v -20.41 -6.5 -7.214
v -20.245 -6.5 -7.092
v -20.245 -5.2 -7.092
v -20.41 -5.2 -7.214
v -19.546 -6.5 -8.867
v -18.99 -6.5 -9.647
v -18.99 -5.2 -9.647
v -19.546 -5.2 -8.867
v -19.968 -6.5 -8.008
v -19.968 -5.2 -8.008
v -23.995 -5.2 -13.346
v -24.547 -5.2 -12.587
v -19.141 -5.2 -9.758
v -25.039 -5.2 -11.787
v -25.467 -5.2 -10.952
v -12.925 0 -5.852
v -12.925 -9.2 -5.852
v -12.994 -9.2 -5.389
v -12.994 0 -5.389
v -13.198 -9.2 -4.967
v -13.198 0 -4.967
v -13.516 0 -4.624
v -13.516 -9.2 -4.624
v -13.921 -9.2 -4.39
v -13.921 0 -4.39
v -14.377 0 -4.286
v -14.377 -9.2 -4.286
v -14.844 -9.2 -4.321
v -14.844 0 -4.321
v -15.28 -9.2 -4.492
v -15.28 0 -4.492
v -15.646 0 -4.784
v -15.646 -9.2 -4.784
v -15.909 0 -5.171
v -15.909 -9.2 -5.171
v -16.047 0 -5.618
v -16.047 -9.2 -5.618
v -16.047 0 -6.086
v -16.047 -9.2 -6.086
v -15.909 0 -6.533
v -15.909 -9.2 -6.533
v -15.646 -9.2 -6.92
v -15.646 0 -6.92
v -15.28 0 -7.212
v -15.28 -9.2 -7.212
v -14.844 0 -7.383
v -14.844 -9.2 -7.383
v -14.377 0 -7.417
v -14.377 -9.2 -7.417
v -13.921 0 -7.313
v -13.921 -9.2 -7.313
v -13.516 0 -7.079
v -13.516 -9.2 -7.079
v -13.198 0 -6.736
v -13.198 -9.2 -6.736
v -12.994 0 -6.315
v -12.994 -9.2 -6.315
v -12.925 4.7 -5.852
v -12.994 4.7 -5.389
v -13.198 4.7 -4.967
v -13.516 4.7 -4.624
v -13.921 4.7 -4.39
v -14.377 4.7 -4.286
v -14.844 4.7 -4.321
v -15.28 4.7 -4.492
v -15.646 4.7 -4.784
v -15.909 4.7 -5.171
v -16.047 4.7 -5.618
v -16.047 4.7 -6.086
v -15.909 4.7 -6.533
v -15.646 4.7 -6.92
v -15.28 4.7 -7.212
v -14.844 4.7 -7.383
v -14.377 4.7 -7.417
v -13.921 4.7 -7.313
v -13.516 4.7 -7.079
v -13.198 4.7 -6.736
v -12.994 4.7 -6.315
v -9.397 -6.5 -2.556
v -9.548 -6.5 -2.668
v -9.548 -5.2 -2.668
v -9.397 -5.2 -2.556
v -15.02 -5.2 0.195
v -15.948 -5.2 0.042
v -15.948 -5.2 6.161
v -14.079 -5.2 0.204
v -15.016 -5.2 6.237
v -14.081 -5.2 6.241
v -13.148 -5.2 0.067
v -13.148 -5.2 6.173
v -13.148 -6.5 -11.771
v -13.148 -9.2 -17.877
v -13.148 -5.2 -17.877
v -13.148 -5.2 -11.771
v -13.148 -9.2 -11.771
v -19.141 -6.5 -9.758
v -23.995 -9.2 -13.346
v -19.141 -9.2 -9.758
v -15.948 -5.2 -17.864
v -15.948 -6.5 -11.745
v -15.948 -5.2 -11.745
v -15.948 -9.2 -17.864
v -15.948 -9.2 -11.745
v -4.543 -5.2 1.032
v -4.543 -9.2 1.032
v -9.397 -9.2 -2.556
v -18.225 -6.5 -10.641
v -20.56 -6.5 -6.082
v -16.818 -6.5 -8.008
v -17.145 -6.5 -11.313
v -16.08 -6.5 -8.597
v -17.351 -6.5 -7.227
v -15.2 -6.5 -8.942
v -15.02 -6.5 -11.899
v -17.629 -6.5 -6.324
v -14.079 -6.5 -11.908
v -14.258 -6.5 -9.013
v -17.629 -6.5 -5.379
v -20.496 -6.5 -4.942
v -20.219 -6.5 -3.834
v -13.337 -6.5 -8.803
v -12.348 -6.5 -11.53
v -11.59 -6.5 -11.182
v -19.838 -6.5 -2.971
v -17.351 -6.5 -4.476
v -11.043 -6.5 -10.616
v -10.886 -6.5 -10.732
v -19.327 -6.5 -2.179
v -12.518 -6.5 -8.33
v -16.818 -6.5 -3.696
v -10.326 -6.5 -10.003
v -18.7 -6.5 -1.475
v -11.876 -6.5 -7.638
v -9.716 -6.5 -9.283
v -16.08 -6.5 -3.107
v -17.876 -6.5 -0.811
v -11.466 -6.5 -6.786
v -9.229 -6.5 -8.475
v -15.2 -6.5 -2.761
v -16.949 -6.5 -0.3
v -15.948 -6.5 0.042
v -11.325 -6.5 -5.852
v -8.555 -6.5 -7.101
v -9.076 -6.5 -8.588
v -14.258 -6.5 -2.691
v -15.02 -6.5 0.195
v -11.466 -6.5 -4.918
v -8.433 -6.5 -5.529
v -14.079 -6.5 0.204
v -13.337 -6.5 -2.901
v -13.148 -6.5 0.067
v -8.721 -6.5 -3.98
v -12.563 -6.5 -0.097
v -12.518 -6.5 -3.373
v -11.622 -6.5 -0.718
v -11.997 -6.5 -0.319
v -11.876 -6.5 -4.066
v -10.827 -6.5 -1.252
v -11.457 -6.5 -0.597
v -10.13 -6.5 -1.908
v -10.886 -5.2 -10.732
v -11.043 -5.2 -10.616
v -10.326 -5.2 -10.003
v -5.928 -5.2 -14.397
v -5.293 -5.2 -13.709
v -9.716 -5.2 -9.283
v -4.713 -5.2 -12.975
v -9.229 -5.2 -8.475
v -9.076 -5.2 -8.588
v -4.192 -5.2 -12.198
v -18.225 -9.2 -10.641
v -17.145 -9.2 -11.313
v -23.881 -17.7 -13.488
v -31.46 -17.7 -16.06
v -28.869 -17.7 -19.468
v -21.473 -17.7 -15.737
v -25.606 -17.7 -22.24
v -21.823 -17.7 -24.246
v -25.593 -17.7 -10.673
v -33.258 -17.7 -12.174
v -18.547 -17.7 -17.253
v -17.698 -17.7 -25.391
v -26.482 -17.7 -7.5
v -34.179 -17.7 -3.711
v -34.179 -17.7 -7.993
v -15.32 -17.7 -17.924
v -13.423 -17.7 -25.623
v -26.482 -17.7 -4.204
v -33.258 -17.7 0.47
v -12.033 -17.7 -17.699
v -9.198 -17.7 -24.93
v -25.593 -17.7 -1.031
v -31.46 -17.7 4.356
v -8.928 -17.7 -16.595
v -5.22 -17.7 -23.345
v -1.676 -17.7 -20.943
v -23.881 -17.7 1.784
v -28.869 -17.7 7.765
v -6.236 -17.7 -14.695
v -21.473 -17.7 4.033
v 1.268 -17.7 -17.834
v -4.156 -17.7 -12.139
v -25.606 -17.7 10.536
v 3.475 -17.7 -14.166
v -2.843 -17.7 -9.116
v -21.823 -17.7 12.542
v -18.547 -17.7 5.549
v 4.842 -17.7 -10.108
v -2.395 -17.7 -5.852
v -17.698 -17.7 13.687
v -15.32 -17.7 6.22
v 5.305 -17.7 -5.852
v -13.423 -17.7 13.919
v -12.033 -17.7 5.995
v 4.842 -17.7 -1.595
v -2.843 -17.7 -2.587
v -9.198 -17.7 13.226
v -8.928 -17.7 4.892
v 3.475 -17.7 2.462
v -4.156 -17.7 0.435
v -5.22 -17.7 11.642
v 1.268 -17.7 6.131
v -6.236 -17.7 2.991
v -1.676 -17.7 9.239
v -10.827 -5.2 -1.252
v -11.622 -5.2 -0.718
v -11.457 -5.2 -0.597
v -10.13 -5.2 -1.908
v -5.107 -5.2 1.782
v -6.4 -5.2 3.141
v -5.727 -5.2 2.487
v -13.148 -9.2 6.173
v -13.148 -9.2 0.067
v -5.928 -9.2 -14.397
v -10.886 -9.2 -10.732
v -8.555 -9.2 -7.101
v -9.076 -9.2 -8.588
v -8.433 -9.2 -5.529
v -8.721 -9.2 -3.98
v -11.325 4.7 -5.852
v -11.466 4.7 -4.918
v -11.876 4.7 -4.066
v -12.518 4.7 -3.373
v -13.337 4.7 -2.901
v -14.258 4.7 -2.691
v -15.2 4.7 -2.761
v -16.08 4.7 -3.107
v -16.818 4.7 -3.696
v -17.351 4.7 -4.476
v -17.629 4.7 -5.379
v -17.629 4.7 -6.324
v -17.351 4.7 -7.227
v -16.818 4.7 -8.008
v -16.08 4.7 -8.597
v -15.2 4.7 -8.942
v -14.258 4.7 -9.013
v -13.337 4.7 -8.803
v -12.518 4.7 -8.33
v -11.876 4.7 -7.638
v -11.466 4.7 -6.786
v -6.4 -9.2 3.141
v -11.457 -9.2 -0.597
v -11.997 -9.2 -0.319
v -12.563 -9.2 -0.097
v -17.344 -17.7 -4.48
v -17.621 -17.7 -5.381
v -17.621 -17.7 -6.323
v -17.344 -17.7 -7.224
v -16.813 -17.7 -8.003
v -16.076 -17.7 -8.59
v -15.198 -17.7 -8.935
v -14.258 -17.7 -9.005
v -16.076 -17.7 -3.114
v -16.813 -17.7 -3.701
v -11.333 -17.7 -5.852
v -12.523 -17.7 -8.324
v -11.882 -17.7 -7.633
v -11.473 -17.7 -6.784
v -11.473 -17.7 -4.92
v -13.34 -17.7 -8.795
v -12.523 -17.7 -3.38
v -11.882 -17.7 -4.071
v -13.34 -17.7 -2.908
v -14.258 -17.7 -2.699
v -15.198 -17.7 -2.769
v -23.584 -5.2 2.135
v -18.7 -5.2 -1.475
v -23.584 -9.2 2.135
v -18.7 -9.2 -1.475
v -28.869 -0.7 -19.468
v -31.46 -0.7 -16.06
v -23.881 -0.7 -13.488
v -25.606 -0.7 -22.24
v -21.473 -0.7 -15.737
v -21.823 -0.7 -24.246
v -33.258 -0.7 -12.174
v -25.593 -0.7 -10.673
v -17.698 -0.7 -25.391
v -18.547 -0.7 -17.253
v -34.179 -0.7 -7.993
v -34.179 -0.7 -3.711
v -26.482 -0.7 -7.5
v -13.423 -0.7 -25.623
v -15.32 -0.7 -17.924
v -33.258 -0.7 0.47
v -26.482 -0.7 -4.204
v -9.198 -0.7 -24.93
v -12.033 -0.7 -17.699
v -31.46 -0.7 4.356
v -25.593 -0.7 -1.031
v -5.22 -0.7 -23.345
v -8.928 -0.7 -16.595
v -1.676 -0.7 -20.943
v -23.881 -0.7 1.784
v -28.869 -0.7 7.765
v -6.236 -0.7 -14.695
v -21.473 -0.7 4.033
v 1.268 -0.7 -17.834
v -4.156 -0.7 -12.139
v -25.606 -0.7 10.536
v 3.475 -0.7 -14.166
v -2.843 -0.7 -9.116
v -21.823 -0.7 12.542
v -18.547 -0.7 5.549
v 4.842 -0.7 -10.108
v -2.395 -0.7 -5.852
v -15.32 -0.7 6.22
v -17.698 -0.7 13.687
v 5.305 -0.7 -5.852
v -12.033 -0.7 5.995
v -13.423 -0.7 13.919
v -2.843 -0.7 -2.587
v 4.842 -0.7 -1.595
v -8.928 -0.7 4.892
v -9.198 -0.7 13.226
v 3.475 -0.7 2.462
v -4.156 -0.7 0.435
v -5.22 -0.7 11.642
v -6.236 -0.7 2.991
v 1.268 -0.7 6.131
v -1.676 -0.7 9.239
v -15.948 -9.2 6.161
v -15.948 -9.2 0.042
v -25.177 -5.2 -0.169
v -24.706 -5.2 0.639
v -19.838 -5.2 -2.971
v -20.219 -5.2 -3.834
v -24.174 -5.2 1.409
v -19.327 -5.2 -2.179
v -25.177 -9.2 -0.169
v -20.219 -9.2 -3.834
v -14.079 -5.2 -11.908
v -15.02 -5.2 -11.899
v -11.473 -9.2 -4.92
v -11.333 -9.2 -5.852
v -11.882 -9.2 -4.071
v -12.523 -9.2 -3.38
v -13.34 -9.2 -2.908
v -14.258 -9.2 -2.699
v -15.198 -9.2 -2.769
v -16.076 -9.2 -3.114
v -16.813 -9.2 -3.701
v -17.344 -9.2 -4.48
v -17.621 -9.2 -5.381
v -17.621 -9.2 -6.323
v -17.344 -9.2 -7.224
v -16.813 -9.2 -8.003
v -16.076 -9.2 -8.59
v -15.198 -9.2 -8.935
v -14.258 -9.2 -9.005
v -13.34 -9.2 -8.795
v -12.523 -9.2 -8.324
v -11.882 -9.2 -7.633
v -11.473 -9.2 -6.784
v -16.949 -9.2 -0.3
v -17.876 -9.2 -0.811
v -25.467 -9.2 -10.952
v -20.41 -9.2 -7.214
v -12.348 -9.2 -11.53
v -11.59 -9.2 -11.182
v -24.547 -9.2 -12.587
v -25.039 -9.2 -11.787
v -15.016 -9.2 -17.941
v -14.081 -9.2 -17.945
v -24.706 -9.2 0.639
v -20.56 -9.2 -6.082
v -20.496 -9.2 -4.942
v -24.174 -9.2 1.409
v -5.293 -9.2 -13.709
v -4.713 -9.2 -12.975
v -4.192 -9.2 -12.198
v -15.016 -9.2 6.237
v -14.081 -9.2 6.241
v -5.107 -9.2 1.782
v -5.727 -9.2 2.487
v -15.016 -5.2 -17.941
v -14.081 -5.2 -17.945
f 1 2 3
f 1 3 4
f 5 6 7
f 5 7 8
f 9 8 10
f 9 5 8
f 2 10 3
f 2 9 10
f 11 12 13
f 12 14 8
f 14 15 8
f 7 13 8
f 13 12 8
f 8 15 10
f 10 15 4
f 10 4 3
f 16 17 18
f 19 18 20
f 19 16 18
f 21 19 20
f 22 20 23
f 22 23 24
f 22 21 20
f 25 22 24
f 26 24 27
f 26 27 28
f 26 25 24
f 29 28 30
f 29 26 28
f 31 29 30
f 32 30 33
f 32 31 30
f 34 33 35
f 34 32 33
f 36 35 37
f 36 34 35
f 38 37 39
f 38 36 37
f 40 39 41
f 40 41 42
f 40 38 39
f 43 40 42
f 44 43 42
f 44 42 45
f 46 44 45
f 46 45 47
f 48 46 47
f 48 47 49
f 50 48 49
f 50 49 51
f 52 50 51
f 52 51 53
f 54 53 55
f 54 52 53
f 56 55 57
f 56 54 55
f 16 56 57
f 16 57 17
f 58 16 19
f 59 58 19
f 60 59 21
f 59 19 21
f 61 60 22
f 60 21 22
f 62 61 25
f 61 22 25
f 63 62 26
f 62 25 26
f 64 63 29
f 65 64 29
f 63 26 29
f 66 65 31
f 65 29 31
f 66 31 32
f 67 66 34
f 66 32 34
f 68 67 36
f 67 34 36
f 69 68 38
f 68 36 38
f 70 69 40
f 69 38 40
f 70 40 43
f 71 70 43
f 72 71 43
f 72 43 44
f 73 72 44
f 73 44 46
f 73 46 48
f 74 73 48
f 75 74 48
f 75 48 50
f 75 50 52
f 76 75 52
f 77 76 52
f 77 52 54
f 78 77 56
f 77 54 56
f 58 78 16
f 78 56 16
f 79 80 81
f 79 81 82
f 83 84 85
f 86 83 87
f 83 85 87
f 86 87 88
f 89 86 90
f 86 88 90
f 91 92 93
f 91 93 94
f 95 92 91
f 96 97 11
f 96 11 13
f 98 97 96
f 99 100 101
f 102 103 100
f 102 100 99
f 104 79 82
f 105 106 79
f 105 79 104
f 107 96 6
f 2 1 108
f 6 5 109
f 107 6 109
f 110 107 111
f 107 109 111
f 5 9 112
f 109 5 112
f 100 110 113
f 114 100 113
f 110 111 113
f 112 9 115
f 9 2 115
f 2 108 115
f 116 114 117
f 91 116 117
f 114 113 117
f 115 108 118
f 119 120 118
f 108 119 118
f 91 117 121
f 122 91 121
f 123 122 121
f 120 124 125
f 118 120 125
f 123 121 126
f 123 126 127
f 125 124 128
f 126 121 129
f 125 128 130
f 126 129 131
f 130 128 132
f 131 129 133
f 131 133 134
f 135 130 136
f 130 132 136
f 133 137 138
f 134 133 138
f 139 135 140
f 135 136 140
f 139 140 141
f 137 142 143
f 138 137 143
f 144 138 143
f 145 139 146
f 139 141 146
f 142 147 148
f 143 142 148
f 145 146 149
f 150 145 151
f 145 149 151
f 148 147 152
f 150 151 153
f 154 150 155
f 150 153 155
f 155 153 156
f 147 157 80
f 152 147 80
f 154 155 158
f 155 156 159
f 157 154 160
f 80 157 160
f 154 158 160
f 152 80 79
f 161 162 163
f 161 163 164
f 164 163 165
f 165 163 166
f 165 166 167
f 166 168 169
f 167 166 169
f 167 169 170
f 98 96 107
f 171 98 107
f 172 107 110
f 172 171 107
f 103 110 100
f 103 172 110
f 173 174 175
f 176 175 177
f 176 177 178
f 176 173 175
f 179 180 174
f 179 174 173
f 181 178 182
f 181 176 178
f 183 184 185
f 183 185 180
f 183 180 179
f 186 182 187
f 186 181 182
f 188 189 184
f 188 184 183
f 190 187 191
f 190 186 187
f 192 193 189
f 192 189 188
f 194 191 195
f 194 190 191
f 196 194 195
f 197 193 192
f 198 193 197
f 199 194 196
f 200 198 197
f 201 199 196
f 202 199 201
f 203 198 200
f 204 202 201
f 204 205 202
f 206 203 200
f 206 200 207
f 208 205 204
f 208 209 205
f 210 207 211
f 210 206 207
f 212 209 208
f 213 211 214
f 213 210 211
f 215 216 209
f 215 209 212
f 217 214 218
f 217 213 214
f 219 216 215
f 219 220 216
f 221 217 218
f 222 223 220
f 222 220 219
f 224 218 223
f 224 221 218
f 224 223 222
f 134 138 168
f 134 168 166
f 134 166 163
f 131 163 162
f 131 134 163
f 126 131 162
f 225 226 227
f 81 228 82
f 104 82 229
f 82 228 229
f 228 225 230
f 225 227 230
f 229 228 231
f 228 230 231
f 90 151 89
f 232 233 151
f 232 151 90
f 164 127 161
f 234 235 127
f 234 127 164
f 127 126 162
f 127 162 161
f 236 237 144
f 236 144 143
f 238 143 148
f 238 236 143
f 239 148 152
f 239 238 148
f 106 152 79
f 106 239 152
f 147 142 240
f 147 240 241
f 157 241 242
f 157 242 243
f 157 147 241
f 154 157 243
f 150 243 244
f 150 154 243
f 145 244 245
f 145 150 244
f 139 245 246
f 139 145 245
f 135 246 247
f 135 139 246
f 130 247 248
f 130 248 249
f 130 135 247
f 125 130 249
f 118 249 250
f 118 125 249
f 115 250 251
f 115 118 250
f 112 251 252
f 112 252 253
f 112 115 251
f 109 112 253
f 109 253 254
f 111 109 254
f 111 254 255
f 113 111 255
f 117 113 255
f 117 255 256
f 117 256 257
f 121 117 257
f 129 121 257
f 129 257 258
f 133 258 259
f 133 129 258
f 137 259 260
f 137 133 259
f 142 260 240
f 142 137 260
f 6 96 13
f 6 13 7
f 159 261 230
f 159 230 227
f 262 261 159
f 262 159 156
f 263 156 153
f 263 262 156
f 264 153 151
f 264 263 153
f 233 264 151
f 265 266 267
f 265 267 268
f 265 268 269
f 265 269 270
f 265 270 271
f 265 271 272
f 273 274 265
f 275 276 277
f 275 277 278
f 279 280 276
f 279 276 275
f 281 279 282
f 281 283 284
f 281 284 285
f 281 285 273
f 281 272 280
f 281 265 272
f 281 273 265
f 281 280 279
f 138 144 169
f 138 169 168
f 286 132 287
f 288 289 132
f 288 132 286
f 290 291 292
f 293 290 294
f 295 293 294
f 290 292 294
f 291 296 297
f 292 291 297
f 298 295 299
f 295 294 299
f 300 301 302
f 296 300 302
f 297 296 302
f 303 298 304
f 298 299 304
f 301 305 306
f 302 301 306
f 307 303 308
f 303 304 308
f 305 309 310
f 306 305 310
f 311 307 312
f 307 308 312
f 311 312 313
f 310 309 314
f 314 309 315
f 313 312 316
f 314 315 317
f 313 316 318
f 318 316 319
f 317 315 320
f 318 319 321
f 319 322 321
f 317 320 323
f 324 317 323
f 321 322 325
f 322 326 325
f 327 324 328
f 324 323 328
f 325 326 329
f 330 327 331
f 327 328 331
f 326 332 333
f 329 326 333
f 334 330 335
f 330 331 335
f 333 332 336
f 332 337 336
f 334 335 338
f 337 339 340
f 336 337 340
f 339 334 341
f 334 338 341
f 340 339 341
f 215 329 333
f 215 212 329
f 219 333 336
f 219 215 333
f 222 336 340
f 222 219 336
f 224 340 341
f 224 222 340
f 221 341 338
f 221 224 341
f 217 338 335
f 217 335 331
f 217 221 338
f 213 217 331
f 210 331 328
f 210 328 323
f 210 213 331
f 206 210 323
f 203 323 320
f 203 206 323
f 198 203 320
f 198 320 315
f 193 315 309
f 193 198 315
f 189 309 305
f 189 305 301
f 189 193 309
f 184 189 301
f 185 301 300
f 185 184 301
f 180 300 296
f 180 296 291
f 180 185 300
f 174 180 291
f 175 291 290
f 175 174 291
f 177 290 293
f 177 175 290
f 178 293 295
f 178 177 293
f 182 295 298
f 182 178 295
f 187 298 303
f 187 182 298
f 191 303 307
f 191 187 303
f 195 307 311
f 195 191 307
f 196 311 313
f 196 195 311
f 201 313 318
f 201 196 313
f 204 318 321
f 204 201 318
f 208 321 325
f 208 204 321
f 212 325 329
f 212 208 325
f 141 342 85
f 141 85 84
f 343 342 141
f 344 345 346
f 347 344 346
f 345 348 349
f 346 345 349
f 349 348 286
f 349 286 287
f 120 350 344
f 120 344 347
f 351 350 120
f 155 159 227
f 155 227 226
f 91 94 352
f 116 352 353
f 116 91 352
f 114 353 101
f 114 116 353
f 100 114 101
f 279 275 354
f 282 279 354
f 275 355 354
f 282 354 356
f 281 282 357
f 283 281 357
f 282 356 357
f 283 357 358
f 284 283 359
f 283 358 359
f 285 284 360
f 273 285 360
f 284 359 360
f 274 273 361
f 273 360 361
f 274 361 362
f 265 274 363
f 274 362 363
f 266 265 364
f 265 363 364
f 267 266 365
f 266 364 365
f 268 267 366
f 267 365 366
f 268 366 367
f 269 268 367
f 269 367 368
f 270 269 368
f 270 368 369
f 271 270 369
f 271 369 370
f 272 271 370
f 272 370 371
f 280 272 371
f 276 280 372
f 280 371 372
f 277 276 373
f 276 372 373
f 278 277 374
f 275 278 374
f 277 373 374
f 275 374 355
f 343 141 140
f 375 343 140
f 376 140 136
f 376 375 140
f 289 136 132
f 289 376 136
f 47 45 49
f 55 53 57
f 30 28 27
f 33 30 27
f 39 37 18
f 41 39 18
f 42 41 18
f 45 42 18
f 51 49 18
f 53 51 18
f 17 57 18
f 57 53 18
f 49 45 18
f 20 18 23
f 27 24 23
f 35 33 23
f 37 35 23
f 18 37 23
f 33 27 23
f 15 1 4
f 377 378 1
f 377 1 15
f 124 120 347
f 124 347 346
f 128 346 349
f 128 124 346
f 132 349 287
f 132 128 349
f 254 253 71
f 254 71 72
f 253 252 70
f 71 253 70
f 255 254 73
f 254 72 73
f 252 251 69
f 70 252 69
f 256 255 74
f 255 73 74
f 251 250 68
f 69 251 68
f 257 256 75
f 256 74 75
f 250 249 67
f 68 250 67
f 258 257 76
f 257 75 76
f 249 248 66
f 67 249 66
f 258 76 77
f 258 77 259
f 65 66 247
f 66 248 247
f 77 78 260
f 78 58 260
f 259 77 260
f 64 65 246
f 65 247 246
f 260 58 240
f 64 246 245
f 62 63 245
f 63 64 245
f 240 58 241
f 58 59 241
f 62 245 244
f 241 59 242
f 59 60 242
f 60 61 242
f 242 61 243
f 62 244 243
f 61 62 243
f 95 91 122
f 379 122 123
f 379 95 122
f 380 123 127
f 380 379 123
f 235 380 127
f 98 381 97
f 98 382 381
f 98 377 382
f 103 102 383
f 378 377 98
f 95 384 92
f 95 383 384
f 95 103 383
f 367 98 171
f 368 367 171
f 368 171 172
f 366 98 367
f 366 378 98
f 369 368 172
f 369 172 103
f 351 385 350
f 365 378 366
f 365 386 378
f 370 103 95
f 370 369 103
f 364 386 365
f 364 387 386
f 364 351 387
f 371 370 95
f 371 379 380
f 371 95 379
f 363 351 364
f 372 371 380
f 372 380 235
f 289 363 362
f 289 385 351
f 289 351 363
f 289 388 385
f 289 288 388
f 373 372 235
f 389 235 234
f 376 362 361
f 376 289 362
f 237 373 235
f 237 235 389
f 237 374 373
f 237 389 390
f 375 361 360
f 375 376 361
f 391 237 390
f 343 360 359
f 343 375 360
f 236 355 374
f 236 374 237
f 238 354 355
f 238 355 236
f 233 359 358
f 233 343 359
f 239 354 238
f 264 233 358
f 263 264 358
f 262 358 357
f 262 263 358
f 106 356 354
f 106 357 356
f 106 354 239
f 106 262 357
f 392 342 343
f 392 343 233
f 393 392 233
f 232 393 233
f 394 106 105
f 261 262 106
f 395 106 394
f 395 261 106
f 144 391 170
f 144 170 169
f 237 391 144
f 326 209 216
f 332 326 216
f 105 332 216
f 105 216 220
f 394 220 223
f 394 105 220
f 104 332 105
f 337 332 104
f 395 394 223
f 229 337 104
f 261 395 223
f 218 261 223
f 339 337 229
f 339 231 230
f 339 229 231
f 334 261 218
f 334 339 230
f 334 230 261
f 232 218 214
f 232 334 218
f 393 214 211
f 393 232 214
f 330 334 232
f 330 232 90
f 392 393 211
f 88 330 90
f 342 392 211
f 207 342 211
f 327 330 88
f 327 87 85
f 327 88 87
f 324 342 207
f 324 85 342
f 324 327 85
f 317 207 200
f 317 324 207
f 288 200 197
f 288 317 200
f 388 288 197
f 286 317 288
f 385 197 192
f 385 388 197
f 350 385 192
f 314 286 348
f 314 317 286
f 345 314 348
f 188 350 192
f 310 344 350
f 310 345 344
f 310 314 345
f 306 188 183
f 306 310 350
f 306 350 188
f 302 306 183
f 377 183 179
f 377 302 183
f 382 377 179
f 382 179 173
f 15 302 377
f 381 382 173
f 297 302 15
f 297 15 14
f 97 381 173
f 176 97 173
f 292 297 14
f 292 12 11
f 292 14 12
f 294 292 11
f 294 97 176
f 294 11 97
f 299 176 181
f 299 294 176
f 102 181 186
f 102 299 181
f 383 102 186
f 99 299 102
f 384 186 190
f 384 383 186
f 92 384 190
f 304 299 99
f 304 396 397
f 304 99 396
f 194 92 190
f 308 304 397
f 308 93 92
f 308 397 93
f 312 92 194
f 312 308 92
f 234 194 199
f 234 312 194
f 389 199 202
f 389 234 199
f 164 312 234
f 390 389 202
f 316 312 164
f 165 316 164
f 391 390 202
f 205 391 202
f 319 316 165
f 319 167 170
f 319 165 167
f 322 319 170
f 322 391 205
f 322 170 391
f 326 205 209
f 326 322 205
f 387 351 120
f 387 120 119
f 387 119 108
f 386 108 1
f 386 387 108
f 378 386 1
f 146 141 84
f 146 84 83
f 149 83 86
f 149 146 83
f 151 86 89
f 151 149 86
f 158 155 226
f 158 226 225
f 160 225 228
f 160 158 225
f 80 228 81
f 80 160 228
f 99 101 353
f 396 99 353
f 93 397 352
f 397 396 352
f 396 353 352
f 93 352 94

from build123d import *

# Parameters (mm, degrees)
F0_R      = 3.17
F0_R_2    = 1.57
F1_DEPTH  = 9.2
F2_R      = 6.07
F2_R_2    = 3.17
F3_DEPTH  = 2.7
F5_DEPTH  = 4
F6_R      = 19.8
F6_R_2    = 12.1
F7_DEPTH  = 8.5
F8_DEPTH  = 4.7
F9_R      = 3.1620005376
F10_DEPTH = 8.5
F11_DEPTH = 3


with BuildPart() as f1:
    # F0 (on Front) → F1 (new body)
    with BuildSketch(Plane.XZ):
        with Locations((-14.4947133958, -5.8518843725)):
            Circle(F0_R)
        with Locations((-14.4947133958, -5.8518843725)):
            Circle(F0_R_2, mode=Mode.SUBTRACT)
    extrude(amount=F1_DEPTH)

    # F8 (add): a face of the model
    f8_faces = [f1.faces().sort_by_distance(p)[0] for p in [
        (-17.575052256, 0, -5.8518843725),
    ]]
    extrude(f8_faces, amount=F8_DEPTH)

    # F9 (on face) → F10 (join, through all)
    with BuildSketch(Plane.XZ.offset(9.2)):
        with Locations((-14.4947133958, -5.8518843725)):
            Circle(F9_R)
    extrude(amount=F10_DEPTH)

    # F11 (add): a face of the model
    f11_faces = [f1.faces().sort_by_distance(p)[0] for p in [
        (-14.4947133958, -17.7, -5.8518843725),
    ]]


with BuildPart() as f3:
    # F2 (on face) → F3 (new body)
    with BuildSketch(Plane.XZ.offset(9.2)):
        with Locations((-14.4947133958, -5.8518843725)):
            Circle(F2_R)
        with Locations((-14.4947133958, -5.8518843725)):
            Circle(F2_R_2, mode=Mode.SUBTRACT)
    extrude(amount=-F3_DEPTH)


with BuildPart() as f5:
    # F4 (on face) → F5 (new body)
    with BuildSketch(Plane.XZ.offset(9.2)):
        with BuildLine():
            Line((-15.9479831574, 6.2612492848), (-15.9479831574, 0.0415787011))
            ThreePointArc((-15.9479831574, 0.0415787011), (-14.5494593079, 0.2178687431), (-13.1479831574, 0.0668331967))
            Line((-13.1479831574, 0.0668331967), (-13.1479831574, 6.2735565541))
            ThreePointArc((-13.1479831574, 6.2735565541), (-14.5483374083, 6.3479977771), (-15.9479831574, 6.2612492848))
        make_face()
    extrude(amount=-F5_DEPTH)


with BuildPart() as f5b:
    # F4 (on face) → F5, piece 2 (new body)
    with BuildSketch(Plane.XZ.offset(9.2)):
        with BuildLine():
            ThreePointArc((-9.3973258546, -2.5561992761), (-10.3108067194, -1.4541775926), (-11.4569494327, -0.5967069155))
            Line((-11.4569494327, -0.5967069155), (-11.6216113174, -0.7184141217))
            ThreePointArc((-11.6216113174, -0.7184141217), (-10.465246014, -1.5657876648), (-9.5481790309, -2.6676999957))
            Line((-9.5481790309, -2.6676999957), (-9.3973258546, -2.5561992761))
        make_face()
        with BuildLine():
            Line((-6.3175093497, 3.2020282617), (-11.4569494327, -0.5967069155))
            ThreePointArc((-11.4569494327, -0.5967069155), (-10.3108067194, -1.4541775926), (-9.3973258546, -2.5561992761))
            Line((-9.3973258546, -2.5561992761), (-4.4629317782, 1.0909794152))
            ThreePointArc((-4.4629317782, 1.0909794152), (-5.3292389654, 2.200076784), (-6.3175093497, 3.2020282617))
        make_face()
    extrude(amount=-F5_DEPTH)


with BuildPart() as f5c:
    # F4 (on face) → F5, piece 3 (new body)
    with BuildSketch(Plane.XZ.offset(9.2)):
        with BuildLine():
            ThreePointArc((-9.0762949538, -8.5878744286), (-9.8553405144, -9.7661045078), (-10.8856064508, -10.7323809722))
            Line((-10.8856064508, -10.7323809722), (-5.8464618601, -14.4569843356))
            ThreePointArc((-5.8464618601, -14.4569843356), (-4.9156940174, -13.4071730995), (-4.1116102126, -12.2574419818))
            Line((-4.1116102126, -12.2574419818), (-9.0762949538, -8.5878744286))
        make_face()
        with BuildLine():
            Line((-11.0433104475, -10.6158165779), (-10.8856064508, -10.7323809722))
            ThreePointArc((-10.8856064508, -10.7323809722), (-9.8553405144, -9.7661045078), (-9.0762949538, -8.5878744286))
            Line((-9.0762949538, -8.5878744286), (-9.2290879071, -8.4749399537))
            ThreePointArc((-9.2290879071, -8.4749399537), (-10.0066754756, -9.6551392938), (-11.0433104475, -10.6158165779))
        make_face()
    extrude(amount=-F5_DEPTH)


with BuildPart() as f5d:
    # F4 (on face) → F5, piece 4 (new body)
    with BuildSketch(Plane.XZ.offset(9.2)):
        with BuildLine():
            ThreePointArc((-13.1479831574, -11.7706019418), (-14.5494593079, -11.9216374882), (-15.9479831574, -11.7453474462))
            Line((-15.9479831574, -11.7453474462), (-15.9479831574, -17.9650180299))
            ThreePointArc((-15.9479831574, -17.9650180299), (-14.5483374083, -18.0517665222), (-13.1479831574, -17.9773252992))
            Line((-13.1479831574, -17.9773252992), (-13.1479831574, -11.7706019418))
        make_face()
    extrude(amount=-F5_DEPTH)


with BuildPart() as f5e:
    # F4 (on face) → F5, piece 5 (new body)
    with BuildSketch(Plane.XZ.offset(9.2)):
        with BuildLine():
            Line((-18.7000286708, -1.4746451241), (-23.6647134121, 2.1949224291))
            ThreePointArc((-23.6647134121, 2.1949224291), (-24.5279332831, 1.0889007916), (-25.2584622432, -0.1089138213))
            Line((-25.2584622432, -0.1089138213), (-20.2193176525, -3.8335171848))
            ThreePointArc((-20.2193176525, -3.8335171848), (-19.5978393815, -2.5650918366), (-18.7000286708, -1.4746451241))
        make_face()
    extrude(amount=-F5_DEPTH)


with BuildPart() as f5f:
    # F4 (on face) → F5, piece 6 (new body)
    with BuildSketch(Plane.XZ.offset(9.2)):
        with BuildLine():
            ThreePointArc((-19.1409038648, -9.7580095787), (-19.9264174704, -8.5614029362), (-20.4098807653, -7.214123335))
            Line((-20.4098807653, -7.214123335), (-25.5493208484, -11.0128585122))
            ThreePointArc((-25.5493208484, -11.0128585122), (-24.8814163191, -12.2516033027), (-24.0752979412, -13.4051882701))
            Line((-24.0752979412, -13.4051882701), (-19.1409038648, -9.7580095787))
        make_face()
        with BuildLine():
            Line((-20.2452188807, -7.0924161289), (-20.4098807653, -7.214123335))
            ThreePointArc((-20.4098807653, -7.214123335), (-19.9264174704, -8.5614029362), (-19.1409038648, -9.7580095787))
            Line((-19.1409038648, -9.7580095787), (-18.9900506885, -9.6465088591))
            ThreePointArc((-18.9900506885, -9.6465088591), (-19.774407608, -8.4465060011), (-20.2452188807, -7.0924161289))
        make_face()
    extrude(amount=-F5_DEPTH)


with BuildPart() as f7:
    # F6 (on face) → F7 (new body, symmetric)
    with BuildSketch(Plane.XZ.offset(9.2)):
        with Locations((-14.4947133958, -5.8518843725)):
            Circle(F6_R)
        with Locations((-14.4947133958, -5.8518843725)):
            Circle(F6_R_2, mode=Mode.SUBTRACT)
    extrude(amount=F7_DEPTH, both=True)


with BuildPart() as f1_1:
    add(f1.part)

    add(f3.part)  # F11 merges F3

    add(f5.part)  # F11 merges F5

    add(f5b.part)  # F11 merges F5b

    add(f5c.part)  # F11 merges F5c

    add(f5d.part)  # F11 merges F5d

    add(f5e.part)  # F11 merges F5e

    add(f5f.part)  # F11 merges F5f

    add(f7.part)  # F11 merges F7
    extrude(f11_faces, amount=-F11_DEPTH)


solid = f1_1.part
